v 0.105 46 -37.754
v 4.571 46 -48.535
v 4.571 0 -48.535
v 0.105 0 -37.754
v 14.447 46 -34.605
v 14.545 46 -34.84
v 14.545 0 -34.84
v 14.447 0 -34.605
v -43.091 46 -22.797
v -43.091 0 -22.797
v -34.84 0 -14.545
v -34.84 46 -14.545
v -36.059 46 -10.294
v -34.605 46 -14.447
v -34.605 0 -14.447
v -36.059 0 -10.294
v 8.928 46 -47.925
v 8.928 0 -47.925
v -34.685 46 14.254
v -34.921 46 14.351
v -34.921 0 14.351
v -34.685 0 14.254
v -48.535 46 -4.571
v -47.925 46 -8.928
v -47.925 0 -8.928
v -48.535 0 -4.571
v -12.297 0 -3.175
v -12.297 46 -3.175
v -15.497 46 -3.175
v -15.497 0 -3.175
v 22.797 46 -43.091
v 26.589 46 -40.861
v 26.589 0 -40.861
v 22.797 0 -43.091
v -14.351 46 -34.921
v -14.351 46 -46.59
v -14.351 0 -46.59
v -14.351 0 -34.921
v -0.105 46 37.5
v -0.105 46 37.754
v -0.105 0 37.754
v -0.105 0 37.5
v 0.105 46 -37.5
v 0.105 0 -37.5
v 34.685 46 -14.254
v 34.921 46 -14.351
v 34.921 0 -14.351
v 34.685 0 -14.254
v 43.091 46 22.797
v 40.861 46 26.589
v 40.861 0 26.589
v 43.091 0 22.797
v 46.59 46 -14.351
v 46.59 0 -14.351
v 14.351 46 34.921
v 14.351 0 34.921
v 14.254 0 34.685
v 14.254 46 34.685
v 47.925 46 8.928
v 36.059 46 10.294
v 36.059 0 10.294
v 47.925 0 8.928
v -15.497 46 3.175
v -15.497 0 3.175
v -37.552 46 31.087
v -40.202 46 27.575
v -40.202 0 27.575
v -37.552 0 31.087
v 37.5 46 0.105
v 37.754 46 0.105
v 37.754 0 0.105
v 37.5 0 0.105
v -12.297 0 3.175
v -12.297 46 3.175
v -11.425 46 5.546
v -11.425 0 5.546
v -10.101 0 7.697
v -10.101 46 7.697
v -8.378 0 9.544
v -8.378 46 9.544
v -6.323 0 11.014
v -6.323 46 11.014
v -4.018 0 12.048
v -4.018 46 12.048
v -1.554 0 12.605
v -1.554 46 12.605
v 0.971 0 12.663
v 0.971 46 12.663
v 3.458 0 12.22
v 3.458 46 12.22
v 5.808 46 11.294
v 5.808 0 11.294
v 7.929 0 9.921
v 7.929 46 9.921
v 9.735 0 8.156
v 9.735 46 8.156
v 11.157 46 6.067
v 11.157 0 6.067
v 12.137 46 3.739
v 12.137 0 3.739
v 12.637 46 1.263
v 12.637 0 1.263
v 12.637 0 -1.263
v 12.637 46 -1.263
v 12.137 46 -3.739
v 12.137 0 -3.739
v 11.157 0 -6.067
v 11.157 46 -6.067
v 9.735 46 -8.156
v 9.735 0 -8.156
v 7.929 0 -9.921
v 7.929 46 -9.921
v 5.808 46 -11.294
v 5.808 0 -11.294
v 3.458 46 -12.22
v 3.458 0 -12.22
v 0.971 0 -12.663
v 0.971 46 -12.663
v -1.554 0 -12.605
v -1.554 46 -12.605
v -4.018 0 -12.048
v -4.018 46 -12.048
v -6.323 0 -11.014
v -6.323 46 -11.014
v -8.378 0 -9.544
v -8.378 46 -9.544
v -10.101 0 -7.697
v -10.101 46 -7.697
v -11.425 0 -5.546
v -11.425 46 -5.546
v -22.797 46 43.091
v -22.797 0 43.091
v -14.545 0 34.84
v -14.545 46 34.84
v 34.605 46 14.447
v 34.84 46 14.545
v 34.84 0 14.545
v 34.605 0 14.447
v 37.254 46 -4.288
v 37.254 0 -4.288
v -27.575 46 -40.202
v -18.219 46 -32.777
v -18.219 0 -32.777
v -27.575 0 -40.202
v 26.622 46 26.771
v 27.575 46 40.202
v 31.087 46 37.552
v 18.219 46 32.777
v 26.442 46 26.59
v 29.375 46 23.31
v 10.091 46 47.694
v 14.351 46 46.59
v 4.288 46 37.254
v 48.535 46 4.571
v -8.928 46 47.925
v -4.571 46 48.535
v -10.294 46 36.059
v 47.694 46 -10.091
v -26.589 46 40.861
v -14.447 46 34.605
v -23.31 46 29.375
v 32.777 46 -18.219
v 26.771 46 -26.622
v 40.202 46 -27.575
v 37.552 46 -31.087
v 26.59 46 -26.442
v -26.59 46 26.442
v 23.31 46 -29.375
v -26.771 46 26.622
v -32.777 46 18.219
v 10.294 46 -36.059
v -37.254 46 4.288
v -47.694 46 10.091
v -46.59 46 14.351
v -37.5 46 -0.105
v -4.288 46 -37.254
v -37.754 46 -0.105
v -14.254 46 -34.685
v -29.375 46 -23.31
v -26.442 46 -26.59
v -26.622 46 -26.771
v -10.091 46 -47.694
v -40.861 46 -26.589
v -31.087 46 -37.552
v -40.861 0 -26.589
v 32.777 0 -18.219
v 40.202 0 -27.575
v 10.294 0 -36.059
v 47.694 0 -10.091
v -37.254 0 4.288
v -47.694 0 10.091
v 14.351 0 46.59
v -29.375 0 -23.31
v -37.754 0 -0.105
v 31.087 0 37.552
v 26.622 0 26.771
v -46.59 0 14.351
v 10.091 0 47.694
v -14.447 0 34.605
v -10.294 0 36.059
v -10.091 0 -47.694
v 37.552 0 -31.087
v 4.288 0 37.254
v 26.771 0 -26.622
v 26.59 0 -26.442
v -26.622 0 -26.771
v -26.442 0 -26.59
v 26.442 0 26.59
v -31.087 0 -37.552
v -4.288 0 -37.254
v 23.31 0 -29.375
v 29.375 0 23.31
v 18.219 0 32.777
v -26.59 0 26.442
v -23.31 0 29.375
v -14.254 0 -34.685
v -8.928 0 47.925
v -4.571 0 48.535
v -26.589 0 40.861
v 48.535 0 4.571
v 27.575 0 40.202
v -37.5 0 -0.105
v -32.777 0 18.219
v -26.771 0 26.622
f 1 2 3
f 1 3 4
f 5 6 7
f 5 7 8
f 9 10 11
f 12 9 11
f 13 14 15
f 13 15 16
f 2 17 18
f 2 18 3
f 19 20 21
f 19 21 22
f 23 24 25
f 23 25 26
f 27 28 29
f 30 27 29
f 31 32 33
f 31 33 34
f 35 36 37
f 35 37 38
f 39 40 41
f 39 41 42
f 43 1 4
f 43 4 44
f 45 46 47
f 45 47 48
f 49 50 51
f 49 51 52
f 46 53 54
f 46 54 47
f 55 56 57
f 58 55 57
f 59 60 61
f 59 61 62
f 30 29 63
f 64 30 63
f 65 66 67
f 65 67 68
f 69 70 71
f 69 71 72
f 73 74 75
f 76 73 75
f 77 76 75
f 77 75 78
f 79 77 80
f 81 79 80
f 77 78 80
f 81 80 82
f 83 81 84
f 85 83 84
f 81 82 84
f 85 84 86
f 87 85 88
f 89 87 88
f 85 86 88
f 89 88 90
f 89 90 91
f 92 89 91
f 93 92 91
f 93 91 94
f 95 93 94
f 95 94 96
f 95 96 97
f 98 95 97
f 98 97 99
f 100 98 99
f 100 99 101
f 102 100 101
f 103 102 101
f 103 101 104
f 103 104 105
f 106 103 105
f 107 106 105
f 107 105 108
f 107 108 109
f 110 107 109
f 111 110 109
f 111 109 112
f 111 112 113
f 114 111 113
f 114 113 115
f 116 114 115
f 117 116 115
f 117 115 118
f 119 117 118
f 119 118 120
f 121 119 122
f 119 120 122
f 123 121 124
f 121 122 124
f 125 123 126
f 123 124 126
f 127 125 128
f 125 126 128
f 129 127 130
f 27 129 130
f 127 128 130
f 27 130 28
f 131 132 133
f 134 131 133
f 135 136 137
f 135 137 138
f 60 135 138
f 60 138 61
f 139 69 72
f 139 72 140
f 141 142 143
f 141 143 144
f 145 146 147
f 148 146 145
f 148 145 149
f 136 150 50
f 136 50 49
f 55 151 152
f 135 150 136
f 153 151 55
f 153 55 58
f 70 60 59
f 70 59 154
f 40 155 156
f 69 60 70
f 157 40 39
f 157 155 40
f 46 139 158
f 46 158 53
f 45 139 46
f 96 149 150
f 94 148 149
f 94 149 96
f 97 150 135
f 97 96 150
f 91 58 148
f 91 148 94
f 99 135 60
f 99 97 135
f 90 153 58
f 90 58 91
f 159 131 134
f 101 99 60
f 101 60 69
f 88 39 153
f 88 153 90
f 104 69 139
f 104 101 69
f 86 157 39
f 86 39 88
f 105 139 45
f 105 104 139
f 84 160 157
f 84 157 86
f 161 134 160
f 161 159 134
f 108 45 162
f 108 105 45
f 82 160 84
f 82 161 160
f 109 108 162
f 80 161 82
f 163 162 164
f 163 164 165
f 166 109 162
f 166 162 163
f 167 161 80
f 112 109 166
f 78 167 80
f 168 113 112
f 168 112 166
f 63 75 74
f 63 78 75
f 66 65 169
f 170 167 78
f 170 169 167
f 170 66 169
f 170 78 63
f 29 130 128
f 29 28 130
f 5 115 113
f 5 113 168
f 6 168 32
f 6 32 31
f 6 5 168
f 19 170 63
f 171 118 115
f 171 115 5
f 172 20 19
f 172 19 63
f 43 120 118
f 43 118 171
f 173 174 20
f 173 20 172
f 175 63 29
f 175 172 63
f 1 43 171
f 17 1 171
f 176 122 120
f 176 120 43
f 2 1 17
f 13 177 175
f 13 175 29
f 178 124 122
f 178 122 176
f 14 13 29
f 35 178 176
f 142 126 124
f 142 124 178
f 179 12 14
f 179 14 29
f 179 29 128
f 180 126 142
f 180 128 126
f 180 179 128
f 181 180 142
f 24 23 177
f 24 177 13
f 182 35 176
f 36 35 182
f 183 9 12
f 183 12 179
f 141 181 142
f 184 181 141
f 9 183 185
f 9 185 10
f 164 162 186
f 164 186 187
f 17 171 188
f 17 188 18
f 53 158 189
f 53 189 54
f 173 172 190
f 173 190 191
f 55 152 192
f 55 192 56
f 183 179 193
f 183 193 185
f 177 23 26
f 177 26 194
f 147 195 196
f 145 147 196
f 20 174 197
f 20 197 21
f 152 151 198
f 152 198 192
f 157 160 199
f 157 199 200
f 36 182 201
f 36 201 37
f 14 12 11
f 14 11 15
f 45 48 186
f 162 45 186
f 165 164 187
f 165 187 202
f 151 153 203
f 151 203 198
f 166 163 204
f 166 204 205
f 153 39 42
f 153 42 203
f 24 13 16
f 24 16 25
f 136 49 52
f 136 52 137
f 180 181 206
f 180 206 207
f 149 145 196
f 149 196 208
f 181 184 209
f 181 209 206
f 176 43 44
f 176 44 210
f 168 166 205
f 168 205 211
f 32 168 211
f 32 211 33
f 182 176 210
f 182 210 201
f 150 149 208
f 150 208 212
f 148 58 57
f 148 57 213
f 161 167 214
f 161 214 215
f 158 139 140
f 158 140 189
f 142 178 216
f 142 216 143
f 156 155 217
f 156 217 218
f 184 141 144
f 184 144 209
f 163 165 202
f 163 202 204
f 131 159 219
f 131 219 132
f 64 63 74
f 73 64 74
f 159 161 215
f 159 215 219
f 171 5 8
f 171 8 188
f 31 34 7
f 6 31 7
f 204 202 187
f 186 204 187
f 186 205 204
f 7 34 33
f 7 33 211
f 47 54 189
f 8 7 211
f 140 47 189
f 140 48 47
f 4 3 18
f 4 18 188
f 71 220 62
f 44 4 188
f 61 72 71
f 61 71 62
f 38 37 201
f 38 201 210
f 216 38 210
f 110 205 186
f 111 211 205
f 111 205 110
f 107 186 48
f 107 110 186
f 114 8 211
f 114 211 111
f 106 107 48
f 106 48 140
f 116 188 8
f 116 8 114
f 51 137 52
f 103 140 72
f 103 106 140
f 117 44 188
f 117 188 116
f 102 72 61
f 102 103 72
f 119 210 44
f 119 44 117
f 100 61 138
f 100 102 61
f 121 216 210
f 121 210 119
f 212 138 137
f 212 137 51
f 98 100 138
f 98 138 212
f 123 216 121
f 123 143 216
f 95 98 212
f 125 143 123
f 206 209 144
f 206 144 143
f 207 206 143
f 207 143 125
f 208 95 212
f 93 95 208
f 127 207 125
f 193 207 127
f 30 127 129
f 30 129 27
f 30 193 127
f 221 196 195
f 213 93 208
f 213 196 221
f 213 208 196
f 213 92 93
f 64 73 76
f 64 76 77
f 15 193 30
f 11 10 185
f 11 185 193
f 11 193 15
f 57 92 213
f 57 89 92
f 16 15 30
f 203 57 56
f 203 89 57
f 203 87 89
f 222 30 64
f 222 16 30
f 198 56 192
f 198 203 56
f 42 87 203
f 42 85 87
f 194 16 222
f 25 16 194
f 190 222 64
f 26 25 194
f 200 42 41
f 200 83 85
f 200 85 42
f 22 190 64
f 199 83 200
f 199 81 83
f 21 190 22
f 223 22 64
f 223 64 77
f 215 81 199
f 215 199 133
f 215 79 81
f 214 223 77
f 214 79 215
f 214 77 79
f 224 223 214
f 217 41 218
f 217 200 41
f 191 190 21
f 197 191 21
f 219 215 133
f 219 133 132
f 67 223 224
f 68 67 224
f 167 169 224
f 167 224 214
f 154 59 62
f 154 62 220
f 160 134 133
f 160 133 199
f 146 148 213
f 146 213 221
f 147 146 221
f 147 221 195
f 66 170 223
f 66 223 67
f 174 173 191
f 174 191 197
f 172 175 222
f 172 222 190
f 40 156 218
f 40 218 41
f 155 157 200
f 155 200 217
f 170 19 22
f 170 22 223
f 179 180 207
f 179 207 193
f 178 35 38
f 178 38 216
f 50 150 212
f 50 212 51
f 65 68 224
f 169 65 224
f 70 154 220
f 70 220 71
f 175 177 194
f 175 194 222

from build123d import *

# Parameters (mm, degrees)
ENL_V_MAT_EXTRU_3_DEPTH      = 285.465287865
R_P_TITION_CIRCULAIRE1_COUNT = 16
ENL_V_MAT_EXTRU_4_DEPTH      = 83.627706895


with BuildPart() as part:
    # Esquisse1 → Révolution1 (revolve)
    with BuildSketch(Plane.XY):
        Polygon((-198.5, 46), (-198.5, 0), (-150, 0), (0, 0), (0, 46), (-150, 46), align=None)
    revolve(axis=Axis((0, 46, 0), (0, -1, 0)))

    # Esquisse5 → Enlèv. mat.-Extru.3 (cut, through all)
    with BuildSketch(Plane(origin=(0, 46, 0), x_dir=(1, 0, 0), z_dir=(0, 1, 0))):
        Polygon((-37.5, 0), (-48.53523435, 4.570943732), (-47.92540835, 8.928478843), (-36.059319151, 10.294440362), (-34.605302242, 14.447250836), (-202.600479892, 84.582990546), (-207.961569477, 0), align=None)
    enl_v_mat_extru_3 = extrude(amount=-ENL_V_MAT_EXTRU_3_DEPTH, mode=Mode.SUBTRACT)

    # Répétition circulaire1: Enlèv. mat.-Extru.3 ×16 about axis
    r_p_tition_circulaire1_axis = Axis((0, 39.3, 0), (0, -1, 0))
    for i in range(1, R_P_TITION_CIRCULAIRE1_COUNT):
        add(enl_v_mat_extru_3.rotate(r_p_tition_circulaire1_axis, i * 360 / R_P_TITION_CIRCULAIRE1_COUNT), mode=Mode.SUBTRACT)

    # Esquisse6 → Enlèv. mat.-Extru.4 (cut, through all)
    with BuildSketch(Plane(origin=(0, 46, 0), x_dir=(1, 0, 0), z_dir=(0, 1, 0))):
        with BuildLine():
            Line((-12.296722124, 3.175), (-15.496722124, 3.175))
            Line((-15.496722124, 3.175), (-15.496722124, -3.175))
            Line((-15.496722124, -3.175), (-12.296722124, -3.175))
            ThreePointArc((-12.296722124, -3.175), (12.7, 0), (-12.296722124, 3.175))
        make_face()
    extrude(amount=-ENL_V_MAT_EXTRU_4_DEPTH, mode=Mode.SUBTRACT)


solid = part.part
